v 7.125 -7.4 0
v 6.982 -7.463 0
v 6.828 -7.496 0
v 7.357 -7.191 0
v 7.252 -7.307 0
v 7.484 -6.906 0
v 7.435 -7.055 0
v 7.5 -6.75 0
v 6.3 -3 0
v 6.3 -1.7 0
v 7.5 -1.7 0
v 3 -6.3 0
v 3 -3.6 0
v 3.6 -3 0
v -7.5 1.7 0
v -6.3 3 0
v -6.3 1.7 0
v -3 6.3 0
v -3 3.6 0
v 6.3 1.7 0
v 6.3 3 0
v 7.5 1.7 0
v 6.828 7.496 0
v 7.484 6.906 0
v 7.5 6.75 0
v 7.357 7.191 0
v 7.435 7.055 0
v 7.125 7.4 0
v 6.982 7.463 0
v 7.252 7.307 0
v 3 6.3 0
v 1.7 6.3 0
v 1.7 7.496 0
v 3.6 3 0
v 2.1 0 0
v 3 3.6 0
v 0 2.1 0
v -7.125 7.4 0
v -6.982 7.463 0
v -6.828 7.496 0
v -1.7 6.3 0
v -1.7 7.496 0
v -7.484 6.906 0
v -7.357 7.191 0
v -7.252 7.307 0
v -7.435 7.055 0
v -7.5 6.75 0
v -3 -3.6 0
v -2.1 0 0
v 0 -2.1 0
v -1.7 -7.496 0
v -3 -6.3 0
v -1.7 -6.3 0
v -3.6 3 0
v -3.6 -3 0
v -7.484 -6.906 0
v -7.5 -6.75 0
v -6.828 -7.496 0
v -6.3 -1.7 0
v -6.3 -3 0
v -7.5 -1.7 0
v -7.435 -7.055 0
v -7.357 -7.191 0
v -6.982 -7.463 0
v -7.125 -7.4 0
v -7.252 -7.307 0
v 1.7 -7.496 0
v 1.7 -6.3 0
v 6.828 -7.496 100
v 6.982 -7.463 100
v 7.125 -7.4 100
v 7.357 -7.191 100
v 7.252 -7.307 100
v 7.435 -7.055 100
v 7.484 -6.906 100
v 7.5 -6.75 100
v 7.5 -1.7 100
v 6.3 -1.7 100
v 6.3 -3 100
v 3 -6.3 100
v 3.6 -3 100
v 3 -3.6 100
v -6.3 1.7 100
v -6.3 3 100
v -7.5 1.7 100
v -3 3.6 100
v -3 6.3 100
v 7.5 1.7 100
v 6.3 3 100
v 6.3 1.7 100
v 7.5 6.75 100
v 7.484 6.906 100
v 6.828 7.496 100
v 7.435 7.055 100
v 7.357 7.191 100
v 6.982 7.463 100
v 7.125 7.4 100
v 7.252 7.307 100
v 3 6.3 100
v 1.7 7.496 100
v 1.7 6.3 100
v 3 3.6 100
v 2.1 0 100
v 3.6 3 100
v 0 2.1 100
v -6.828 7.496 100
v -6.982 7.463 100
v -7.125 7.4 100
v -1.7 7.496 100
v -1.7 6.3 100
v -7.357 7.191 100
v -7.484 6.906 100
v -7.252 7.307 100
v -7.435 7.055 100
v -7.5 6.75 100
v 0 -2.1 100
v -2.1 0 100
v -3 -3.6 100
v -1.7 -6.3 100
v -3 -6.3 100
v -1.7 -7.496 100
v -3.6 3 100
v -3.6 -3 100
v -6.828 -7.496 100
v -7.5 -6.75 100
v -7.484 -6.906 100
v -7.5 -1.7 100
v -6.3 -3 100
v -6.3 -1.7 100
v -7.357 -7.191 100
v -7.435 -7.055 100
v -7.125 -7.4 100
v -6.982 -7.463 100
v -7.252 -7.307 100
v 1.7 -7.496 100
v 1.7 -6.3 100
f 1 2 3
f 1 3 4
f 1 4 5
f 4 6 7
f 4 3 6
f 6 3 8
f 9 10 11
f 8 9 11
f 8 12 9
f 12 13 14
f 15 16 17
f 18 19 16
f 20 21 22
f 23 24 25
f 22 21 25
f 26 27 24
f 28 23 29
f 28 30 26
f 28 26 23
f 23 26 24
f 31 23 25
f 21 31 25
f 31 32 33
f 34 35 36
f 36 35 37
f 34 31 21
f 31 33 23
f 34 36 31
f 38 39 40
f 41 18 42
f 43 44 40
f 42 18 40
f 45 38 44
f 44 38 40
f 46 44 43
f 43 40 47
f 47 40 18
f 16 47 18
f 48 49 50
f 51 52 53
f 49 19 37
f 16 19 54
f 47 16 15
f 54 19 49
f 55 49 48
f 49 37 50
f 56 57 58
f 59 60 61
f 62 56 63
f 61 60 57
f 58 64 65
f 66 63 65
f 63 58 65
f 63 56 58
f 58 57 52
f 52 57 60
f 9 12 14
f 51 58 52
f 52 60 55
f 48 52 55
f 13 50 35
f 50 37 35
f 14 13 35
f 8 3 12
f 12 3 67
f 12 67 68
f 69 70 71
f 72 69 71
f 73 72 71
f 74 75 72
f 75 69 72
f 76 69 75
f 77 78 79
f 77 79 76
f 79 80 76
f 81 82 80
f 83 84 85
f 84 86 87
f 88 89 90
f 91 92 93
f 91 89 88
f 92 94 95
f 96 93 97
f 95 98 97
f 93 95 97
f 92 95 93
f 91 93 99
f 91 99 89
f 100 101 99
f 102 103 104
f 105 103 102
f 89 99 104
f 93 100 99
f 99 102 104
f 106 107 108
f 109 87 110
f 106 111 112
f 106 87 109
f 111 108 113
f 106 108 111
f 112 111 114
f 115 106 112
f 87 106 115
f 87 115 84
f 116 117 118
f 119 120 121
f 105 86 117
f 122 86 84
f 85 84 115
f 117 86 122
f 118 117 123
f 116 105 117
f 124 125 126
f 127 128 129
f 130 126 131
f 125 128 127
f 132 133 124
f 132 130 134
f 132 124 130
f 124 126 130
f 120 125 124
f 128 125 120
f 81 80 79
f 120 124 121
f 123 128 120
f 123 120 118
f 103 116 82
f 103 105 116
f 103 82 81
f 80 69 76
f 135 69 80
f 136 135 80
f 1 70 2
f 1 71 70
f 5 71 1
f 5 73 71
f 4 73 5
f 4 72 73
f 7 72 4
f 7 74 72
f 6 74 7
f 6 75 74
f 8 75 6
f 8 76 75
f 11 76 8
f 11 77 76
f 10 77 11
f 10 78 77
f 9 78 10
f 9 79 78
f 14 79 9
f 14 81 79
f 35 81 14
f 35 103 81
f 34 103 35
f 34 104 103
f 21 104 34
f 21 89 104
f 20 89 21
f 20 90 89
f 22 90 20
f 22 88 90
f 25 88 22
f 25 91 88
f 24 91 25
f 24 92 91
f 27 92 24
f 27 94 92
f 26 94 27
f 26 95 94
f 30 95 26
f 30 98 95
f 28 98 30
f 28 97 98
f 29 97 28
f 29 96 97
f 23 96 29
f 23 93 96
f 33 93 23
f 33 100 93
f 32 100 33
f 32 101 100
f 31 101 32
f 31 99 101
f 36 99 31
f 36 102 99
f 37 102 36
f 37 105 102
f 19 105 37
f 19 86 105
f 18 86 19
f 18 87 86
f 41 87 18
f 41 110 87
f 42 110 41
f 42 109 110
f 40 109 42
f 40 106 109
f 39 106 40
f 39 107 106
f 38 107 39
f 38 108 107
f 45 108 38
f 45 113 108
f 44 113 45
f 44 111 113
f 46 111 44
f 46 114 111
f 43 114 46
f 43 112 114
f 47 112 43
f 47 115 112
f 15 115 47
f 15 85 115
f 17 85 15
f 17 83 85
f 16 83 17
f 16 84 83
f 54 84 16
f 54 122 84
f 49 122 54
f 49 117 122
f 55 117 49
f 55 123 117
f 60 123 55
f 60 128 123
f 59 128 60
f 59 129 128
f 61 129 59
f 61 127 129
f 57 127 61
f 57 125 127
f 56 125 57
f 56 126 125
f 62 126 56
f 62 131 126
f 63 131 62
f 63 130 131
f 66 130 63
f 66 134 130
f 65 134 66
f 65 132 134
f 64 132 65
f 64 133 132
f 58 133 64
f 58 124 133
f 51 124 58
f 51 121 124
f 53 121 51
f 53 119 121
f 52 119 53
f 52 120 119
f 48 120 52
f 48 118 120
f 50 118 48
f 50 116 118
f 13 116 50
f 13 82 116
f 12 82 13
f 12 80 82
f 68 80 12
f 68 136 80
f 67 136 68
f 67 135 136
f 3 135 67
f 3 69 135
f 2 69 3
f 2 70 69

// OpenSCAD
LENGTH = 100;
NUT_CUTOUT = 6;
NUT_HEIGHT = 2.7;
SLOT_HEIGHT = 1.2;
CUT_DEPTH = 1.5;
EXTERIOR_SIZE = 15;
CHAMFER = 1.5;
SLOT_OPENING = 3.4;
$fs = 0.1;

module rounded_square(size, fillet){
    
    translation = size/2 - fillet/2;
    
    hull(){
        translate([translation,translation,0])
            circle(d=fillet);
         translate([translation,-translation,0])
            circle(d=fillet);
        translate([-translation,translation,0])
            circle(d=fillet);
        translate([-translation,-translation,0])
            circle(d=fillet);    
    }
    
}

module extrusion_cutout(){
    translate([0,EXTERIOR_SIZE/2 - SLOT_HEIGHT,0])
        square([SLOT_OPENING, SLOT_HEIGHT*2], true);
    translate([0,EXTERIOR_SIZE/2-SLOT_HEIGHT,0])
        polygon([[-NUT_CUTOUT/2,0],[NUT_CUTOUT/2,0],[NUT_CUTOUT/2, -NUT_HEIGHT],[0, -NUT_HEIGHT - CUT_DEPTH],[-NUT_CUTOUT/2, -NUT_HEIGHT]]);
}

module extrusion(){
    difference(){
        rounded_square(EXTERIOR_SIZE, CHAMFER);
        extrusion_cutout();
        rotate([0,0,90])
            extrusion_cutout();
        rotate([0,0,180])
            extrusion_cutout();
        rotate([0,0,270])
            extrusion_cutout();
    }
}

linear_extrude(LENGTH){
    extrusion();
}
